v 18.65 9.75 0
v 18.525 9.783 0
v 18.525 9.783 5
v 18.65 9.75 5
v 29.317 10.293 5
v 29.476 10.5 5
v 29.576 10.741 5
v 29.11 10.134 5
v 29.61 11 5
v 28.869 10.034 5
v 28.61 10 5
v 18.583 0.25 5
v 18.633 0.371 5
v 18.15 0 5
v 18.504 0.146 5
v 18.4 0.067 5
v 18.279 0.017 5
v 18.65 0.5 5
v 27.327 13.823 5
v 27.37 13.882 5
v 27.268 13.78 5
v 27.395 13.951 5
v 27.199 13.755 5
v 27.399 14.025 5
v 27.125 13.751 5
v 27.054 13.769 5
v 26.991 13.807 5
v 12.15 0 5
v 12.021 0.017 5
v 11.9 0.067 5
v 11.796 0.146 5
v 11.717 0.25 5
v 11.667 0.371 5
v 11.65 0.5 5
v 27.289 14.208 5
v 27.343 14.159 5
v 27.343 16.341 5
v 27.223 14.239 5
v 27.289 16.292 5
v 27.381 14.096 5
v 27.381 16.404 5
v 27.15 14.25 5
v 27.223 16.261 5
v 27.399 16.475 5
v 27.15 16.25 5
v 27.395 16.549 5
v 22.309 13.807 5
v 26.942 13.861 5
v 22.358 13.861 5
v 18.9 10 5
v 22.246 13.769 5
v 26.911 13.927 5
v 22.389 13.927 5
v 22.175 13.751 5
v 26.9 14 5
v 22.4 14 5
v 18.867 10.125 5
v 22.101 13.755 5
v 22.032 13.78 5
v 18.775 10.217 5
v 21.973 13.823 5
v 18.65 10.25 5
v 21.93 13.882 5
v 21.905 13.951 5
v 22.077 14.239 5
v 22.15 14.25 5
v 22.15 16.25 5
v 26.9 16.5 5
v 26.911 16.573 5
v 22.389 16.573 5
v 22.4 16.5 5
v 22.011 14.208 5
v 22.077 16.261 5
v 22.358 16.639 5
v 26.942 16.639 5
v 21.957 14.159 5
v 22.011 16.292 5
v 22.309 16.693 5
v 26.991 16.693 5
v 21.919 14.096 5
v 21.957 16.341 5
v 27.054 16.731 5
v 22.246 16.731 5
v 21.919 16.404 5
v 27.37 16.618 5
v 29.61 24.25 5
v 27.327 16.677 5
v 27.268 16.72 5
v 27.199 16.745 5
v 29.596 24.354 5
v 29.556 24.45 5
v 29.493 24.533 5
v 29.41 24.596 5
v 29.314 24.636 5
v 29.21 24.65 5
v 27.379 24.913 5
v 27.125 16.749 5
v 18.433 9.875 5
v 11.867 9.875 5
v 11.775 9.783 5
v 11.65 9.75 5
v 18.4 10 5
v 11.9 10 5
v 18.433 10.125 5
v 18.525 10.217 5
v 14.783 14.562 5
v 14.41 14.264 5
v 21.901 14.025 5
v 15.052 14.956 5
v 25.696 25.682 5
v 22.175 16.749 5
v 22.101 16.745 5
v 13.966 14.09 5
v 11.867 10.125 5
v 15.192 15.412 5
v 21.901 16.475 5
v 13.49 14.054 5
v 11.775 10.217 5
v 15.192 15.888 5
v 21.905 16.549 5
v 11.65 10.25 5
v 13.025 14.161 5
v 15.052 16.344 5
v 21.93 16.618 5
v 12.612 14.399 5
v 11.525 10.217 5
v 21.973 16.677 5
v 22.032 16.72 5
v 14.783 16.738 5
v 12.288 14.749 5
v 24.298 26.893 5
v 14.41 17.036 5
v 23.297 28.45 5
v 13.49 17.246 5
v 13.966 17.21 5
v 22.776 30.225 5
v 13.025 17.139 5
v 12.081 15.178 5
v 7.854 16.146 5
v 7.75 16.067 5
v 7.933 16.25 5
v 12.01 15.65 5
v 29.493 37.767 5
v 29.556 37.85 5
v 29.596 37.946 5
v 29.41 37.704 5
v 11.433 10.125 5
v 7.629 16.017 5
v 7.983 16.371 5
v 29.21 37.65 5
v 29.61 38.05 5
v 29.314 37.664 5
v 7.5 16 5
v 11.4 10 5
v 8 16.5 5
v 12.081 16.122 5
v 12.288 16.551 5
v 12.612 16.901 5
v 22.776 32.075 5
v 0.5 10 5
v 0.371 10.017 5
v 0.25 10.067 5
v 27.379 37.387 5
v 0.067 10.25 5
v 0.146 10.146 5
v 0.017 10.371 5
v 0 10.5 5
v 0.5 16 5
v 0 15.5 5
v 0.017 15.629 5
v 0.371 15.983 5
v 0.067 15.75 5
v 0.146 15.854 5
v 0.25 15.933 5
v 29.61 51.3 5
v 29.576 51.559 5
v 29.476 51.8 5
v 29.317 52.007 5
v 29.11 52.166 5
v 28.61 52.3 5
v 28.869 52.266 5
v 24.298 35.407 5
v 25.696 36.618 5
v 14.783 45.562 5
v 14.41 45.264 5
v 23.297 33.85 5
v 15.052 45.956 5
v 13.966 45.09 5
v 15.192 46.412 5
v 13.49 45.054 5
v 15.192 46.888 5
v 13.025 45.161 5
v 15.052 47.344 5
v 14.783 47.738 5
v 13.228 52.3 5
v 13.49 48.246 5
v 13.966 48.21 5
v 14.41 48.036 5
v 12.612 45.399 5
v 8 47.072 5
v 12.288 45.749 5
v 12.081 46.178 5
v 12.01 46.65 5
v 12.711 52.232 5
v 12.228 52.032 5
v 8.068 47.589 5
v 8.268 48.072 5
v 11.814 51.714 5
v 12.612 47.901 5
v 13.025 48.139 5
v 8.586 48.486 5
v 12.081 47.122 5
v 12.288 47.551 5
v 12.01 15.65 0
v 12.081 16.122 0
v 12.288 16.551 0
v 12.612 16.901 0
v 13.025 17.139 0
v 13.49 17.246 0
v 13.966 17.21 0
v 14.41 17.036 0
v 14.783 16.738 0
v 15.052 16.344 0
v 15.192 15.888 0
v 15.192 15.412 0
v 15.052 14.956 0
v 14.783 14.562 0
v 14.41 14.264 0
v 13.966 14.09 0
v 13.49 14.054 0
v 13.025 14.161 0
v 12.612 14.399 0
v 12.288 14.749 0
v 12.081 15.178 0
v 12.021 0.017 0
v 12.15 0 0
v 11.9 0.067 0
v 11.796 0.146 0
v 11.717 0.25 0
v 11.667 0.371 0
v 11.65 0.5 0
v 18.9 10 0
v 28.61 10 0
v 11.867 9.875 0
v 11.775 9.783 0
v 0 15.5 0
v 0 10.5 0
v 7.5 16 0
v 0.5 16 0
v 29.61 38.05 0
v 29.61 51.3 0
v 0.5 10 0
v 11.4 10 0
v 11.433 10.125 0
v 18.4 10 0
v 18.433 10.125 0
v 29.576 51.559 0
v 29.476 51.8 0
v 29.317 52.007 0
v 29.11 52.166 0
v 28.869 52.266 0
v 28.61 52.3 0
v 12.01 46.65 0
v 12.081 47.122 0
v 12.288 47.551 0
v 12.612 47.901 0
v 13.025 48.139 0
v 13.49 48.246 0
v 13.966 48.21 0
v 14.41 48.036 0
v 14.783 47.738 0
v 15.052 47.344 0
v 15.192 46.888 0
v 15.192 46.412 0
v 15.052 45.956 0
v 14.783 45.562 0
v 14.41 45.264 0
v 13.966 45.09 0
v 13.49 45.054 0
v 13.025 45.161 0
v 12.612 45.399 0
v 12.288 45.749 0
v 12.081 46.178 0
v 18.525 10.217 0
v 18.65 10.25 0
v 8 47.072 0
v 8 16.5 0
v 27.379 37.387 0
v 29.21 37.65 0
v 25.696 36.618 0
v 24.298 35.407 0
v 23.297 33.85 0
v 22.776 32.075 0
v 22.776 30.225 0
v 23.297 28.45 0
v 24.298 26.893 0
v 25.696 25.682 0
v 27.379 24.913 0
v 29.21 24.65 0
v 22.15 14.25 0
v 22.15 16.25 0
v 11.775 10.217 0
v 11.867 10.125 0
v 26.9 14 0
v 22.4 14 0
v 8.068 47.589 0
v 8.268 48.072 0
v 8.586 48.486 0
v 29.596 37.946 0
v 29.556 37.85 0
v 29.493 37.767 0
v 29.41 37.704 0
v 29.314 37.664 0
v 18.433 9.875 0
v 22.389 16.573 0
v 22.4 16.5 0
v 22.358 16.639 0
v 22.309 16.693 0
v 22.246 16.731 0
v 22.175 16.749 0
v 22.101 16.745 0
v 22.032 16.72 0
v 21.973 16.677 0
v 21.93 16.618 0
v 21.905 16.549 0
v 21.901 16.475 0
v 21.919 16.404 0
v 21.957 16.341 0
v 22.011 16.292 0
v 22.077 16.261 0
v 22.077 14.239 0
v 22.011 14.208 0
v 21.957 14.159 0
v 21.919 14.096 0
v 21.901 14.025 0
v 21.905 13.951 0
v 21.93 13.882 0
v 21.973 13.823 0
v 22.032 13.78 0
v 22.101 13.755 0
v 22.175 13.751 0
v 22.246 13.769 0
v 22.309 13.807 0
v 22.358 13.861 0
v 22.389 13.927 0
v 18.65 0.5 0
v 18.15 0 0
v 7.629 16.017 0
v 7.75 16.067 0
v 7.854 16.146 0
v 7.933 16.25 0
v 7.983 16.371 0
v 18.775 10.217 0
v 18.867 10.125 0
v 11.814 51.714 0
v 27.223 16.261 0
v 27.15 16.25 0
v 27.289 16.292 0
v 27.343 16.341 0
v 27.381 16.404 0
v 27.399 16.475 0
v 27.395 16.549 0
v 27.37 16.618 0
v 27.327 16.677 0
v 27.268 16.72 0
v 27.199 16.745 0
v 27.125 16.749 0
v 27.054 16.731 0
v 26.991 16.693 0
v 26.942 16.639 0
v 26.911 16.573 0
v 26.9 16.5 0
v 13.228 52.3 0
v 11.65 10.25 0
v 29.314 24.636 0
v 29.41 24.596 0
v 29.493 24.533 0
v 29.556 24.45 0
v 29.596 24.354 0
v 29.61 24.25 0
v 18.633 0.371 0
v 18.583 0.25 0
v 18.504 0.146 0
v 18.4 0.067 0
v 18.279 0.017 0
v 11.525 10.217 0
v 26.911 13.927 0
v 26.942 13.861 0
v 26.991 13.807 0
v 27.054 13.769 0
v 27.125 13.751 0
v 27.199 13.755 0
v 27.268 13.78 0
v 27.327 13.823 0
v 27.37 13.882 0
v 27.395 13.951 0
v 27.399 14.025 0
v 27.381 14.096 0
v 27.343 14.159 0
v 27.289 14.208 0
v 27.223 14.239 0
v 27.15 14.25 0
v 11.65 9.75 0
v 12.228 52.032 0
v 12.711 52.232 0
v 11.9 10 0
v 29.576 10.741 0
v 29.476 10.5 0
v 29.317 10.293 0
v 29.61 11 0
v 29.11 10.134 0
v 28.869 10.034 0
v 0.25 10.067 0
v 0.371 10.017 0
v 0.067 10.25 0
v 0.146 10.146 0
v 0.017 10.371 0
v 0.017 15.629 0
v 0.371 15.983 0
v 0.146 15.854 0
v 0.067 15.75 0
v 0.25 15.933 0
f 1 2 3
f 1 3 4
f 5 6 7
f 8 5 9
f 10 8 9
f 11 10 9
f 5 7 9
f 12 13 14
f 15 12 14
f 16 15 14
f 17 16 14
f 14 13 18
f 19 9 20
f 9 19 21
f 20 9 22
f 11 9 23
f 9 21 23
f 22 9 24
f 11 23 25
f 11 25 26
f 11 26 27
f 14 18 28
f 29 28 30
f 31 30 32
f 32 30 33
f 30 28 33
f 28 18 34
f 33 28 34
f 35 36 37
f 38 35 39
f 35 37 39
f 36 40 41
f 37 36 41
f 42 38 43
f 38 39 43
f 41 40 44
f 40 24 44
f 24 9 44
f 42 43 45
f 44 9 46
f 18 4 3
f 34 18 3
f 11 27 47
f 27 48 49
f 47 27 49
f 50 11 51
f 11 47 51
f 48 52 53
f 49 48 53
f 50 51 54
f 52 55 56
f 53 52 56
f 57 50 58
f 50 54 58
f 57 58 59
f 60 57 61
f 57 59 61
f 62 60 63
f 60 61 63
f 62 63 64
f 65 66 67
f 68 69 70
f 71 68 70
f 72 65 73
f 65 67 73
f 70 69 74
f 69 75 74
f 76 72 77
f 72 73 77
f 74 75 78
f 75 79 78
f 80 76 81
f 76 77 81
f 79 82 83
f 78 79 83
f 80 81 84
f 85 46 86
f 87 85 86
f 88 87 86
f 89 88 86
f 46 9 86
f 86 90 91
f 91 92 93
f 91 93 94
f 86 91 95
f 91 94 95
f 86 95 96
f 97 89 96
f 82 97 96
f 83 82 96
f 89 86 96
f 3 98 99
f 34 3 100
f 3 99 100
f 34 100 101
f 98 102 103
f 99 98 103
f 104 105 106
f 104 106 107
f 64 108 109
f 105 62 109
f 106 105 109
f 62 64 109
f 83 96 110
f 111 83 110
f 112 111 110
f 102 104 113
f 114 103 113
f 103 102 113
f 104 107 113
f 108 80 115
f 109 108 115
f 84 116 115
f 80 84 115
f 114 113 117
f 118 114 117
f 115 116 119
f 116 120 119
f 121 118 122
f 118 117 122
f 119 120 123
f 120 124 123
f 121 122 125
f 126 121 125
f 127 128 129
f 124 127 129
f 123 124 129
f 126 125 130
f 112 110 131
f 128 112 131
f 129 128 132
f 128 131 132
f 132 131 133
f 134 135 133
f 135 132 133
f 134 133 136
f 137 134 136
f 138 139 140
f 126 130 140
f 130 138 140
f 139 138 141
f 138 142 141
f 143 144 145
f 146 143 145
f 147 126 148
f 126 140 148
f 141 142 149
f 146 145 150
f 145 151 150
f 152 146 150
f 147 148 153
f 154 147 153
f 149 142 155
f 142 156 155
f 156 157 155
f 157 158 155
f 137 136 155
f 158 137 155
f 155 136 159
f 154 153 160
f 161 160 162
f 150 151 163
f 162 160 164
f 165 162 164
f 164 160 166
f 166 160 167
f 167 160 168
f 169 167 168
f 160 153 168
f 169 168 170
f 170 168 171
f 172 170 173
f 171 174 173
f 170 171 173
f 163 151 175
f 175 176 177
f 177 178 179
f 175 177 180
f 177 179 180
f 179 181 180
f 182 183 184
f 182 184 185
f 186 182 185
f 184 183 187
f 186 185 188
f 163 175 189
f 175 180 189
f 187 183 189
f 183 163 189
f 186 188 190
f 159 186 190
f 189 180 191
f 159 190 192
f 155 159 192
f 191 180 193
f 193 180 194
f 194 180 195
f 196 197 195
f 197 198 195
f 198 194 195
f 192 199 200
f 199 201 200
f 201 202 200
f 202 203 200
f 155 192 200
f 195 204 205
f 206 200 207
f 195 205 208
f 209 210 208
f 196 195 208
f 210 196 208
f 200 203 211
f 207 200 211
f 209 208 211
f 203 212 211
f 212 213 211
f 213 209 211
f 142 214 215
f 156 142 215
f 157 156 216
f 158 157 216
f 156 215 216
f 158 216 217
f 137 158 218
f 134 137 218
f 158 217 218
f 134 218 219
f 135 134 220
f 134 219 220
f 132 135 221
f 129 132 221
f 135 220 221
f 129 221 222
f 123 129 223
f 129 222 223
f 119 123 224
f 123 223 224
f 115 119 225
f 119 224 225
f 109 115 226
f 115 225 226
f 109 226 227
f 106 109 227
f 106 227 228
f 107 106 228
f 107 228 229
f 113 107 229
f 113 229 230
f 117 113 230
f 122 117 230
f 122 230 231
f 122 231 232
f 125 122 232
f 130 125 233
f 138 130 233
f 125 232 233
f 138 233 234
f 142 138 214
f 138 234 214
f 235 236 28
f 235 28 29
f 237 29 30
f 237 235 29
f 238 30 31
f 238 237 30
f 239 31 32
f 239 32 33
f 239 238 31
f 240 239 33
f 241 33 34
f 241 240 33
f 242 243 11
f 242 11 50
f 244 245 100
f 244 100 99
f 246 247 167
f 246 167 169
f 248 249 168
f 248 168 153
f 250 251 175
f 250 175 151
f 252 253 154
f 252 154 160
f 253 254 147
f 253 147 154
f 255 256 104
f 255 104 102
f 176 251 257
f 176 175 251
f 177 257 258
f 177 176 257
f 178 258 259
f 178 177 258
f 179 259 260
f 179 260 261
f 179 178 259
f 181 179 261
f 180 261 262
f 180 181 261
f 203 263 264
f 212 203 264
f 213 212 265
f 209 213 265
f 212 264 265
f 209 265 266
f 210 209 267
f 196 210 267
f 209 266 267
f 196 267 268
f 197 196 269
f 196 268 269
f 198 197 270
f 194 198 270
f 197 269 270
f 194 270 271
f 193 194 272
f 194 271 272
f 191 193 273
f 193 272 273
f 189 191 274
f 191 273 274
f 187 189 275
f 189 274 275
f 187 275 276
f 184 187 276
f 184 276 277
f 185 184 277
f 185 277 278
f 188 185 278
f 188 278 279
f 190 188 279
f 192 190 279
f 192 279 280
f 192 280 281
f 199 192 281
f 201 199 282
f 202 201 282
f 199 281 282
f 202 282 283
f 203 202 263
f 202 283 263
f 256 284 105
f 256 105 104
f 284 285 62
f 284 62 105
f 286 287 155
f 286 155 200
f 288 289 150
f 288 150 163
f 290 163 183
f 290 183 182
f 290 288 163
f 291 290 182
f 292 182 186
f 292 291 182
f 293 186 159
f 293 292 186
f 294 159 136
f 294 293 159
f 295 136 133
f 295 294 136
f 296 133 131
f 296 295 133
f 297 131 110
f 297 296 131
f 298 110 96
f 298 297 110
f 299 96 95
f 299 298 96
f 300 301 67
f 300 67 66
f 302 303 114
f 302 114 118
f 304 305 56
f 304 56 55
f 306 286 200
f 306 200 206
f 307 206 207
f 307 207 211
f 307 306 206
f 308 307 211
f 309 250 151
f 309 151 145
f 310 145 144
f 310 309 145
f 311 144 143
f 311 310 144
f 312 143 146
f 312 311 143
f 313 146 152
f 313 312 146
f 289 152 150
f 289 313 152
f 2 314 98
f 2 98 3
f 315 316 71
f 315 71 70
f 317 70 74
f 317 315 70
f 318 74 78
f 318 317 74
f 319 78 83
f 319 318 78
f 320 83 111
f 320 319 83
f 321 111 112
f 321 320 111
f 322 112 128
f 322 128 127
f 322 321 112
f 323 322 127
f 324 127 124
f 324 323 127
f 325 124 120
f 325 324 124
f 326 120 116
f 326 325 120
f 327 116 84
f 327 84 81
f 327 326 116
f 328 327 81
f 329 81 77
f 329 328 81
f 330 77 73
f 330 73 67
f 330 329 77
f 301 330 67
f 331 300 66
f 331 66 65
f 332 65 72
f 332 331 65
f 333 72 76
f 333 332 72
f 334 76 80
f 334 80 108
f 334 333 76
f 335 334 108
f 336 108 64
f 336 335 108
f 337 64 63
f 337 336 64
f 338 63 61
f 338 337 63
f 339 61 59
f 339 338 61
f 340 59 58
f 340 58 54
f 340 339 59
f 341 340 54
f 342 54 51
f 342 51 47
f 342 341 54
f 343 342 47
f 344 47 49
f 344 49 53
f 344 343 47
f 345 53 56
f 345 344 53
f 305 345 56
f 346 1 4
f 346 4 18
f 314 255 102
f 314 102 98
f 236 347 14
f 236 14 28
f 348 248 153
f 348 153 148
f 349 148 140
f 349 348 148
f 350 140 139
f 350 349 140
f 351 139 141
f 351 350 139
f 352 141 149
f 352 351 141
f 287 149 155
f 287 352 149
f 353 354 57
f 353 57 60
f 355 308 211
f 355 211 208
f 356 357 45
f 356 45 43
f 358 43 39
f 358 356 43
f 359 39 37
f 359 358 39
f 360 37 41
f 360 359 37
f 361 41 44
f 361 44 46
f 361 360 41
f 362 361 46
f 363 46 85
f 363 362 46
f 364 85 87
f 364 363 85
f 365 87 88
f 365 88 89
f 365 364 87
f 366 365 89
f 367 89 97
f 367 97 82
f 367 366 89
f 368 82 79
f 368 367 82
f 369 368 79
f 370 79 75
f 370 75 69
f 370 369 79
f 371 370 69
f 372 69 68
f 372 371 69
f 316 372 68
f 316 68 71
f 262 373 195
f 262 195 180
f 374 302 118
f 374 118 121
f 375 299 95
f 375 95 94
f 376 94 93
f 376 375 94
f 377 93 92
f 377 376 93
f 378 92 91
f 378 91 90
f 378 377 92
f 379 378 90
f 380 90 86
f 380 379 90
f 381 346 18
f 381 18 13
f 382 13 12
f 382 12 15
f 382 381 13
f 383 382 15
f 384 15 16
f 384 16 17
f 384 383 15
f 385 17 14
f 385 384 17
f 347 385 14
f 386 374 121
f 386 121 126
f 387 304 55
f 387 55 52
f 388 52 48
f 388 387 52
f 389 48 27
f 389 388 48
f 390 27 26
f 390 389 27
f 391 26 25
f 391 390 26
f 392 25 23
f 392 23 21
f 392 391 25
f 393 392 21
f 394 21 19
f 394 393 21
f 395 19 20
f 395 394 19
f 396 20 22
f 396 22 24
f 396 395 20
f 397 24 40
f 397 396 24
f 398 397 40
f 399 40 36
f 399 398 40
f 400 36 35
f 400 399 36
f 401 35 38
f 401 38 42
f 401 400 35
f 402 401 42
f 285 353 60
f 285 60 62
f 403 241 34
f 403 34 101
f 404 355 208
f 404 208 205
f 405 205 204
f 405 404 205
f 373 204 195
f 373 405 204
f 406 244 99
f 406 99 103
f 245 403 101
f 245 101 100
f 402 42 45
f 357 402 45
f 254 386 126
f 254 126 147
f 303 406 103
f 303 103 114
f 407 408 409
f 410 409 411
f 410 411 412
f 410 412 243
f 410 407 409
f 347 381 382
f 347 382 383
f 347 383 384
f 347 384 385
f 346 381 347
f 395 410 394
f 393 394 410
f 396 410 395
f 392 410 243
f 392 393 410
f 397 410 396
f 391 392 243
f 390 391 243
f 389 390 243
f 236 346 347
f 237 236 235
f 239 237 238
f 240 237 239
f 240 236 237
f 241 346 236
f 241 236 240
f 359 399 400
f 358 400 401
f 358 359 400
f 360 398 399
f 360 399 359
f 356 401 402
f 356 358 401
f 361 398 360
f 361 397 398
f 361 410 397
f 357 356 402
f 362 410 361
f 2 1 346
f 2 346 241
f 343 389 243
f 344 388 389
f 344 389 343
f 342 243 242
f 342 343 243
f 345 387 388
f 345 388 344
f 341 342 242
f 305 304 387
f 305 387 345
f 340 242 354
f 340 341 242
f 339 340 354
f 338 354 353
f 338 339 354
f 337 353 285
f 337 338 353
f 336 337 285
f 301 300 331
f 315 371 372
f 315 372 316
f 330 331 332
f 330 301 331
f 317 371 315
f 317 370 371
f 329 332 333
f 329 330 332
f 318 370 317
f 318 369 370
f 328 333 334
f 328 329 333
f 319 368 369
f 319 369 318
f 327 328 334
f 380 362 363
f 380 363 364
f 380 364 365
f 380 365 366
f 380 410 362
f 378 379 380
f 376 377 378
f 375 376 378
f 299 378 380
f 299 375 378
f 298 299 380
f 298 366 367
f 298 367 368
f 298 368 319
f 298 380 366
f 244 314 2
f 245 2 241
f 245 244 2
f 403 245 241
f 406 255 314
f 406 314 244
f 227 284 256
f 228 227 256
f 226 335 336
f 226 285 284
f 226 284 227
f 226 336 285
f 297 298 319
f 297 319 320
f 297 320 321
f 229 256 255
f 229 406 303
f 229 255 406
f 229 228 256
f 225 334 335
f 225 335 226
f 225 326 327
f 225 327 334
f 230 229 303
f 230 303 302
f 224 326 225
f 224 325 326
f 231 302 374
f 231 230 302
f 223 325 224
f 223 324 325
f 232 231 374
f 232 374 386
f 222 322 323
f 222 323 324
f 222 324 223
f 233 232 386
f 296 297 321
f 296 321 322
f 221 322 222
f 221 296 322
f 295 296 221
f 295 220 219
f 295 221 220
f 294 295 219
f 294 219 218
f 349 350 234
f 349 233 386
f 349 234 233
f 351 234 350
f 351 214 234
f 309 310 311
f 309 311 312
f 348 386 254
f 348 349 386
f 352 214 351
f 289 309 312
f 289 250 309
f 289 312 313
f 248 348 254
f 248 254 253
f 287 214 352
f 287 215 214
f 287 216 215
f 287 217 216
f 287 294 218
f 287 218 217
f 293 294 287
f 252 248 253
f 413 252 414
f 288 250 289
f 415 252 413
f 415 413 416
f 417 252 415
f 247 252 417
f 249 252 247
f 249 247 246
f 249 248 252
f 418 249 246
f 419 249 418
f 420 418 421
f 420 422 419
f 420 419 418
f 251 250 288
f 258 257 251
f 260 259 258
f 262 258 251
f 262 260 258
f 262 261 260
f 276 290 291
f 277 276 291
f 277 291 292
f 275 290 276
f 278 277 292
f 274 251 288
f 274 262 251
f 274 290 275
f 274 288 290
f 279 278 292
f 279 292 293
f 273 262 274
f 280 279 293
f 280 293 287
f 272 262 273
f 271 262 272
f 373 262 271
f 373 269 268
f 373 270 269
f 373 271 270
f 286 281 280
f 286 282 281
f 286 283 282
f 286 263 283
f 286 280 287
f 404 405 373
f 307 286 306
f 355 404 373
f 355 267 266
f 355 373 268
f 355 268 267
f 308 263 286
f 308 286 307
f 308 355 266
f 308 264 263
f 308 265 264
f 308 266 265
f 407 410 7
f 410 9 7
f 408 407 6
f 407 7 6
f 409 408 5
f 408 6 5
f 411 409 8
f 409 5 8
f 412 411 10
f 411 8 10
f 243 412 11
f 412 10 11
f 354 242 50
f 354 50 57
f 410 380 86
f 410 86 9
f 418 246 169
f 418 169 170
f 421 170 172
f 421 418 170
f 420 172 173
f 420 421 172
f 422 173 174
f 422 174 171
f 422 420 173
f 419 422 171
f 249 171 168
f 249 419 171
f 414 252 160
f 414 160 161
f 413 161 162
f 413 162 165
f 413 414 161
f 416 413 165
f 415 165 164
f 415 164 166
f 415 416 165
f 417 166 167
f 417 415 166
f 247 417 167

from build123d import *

# Parameters (mm, degrees)
ESQUISSE1_R        = 1.6
BOSS_EXTRU_1_DEPTH = 5
CONG_1_R           = 1


with BuildPart() as part:
    # Esquisse1 → Boss.-Extru.1 (new body)
    with BuildSketch(Plane(origin=(0, 0, 0), x_dir=(-1, 0, 0), z_dir=(0, 0, -1))):
        with BuildLine():
            Line((-29.61, 24.250000923), (-29.61, 10))
            Line((-29.61, 10), (-18.900000032, 10))
            Line((-18.900000032, 10), (-18.866500027, 10.125000016))
            Line((-18.866500027, 10.125000016), (-18.775000016, 10.216510027))
            Line((-18.775000016, 10.216510027), (-18.65, 10.250000032))
            Line((-18.65, 10.250000032), (-18.524999984, 10.216510027))
            Line((-18.524999984, 10.216510027), (-18.433489973, 10.125000016))
            Line((-18.433489973, 10.125000016), (-18.399999968, 10))
            Line((-18.399999968, 10), (-18.433489973, 9.874995396))
            Line((-18.433489973, 9.874995396), (-18.524999984, 9.783488385))
            Line((-18.524999984, 9.783488385), (-18.65, 9.74999538))
            Line((-18.65, 9.74999538), (-18.65, 0.499994211))
            ThreePointArc((-18.65, 0.499994211), (-18.503553372, 0.146440776), (-18.149999937, -5.852e-06))
            Line((-18.149999937, -5.852e-06), (-12.150000163, -5.852e-06))
            ThreePointArc((-12.150000163, -5.852e-06), (-11.796446657, 0.146440805), (-11.65, 0.499994311))
            Line((-11.65, 0.499994311), (-11.65, 9.74999538))
            Line((-11.65, 9.74999538), (-11.775000016, 9.783488385))
            Line((-11.775000016, 9.783488385), (-11.866510027, 9.874995396))
            Line((-11.866510027, 9.874995396), (-11.900000032, 9.999995412))
            Line((-11.900000032, 9.999995412), (-11.866510027, 10.124995428))
            Line((-11.866510027, 10.124995428), (-11.775000016, 10.216505439))
            Line((-11.775000016, 10.216505439), (-11.65, 10.249995444))
            Line((-11.65, 10.249995444), (-11.524999984, 10.216505439))
            Line((-11.524999984, 10.216505439), (-11.433489973, 10.124995428))
            Line((-11.433489973, 10.124995428), (-11.399999968, 9.999995412))
            Line((-11.399999968, 9.999995412), (-0.499947825, 9.999995412))
            ThreePointArc((-0.499947825, 9.999995412), (-0.14639439, 10.14644204), (5.2238e-05, 10.499995475))
            Line((5.2238e-05, 10.499995475), (5.2238e-05, 15.499995349))
            ThreePointArc((5.2238e-05, 15.499995349), (-0.14639439, 15.853548784), (-0.499947825, 15.999995412))
            Line((-0.499947825, 15.999995412), (-7.49994871, 15.999995412))
            ThreePointArc((-7.49994871, 15.999995412), (-7.853502145, 16.14644204), (-7.999948773, 16.499995475))
            Line((-7.999948773, 16.499995475), (-7.999948773, 47.071569339))
            ThreePointArc((-7.999948773, 47.071569339), (-8.152190984, 47.836942158), (-8.585740096, 48.485793767))
            Line((-8.585740096, 48.485793767), (-11.814159255, 51.714209926))
            ThreePointArc((-11.814159255, 51.714209926), (-12.46301048, 52.147758127), (-13.228382526, 52.3))
            Line((-13.228382526, 52.3), (-29.61, 52.3))
            Line((-29.61, 52.3), (-29.61, 38.049999077))
            ThreePointArc((-29.61, 38.049999077), (-29.492842932, 37.767156996), (-29.210000822, 37.65))
            ThreePointArc((-29.210000822, 37.65), (-22.71, 31.15), (-29.210000822, 24.65))
            ThreePointArc((-29.210000822, 24.65), (-29.492842932, 24.532843004), (-29.61, 24.250000923))
        make_face()
        with Locations((-13.61, 46.65)):
            Circle(ESQUISSE1_R, mode=Mode.SUBTRACT)
        with Locations((-13.61, 15.65)):
            Circle(ESQUISSE1_R, mode=Mode.SUBTRACT)
        with BuildLine():
            Line((-22.400002831, 14.000001769), (-26.900003431, 14.000001769))
            ThreePointArc((-26.900003431, 14.000001769), (-27.326780127, 13.823225074), (-27.150003431, 14.250001769))
            Line((-27.150003431, 14.250001769), (-27.150003431, 16.250002022))
            ThreePointArc((-27.150003431, 16.250002022), (-27.326780127, 16.676778718), (-26.900003431, 16.500002022))
            Line((-26.900003431, 16.500002022), (-22.400002831, 16.500002022))
            ThreePointArc((-22.400002831, 16.500002022), (-21.973226158, 16.676778803), (-22.150002831, 16.250002085))
            Line((-22.150002831, 16.250002085), (-22.150002831, 14.250001769))
            ThreePointArc((-22.150002831, 14.250001769), (-21.973226136, 13.823225074), (-22.400002831, 14.000001769))
        make_face(mode=Mode.SUBTRACT)
    extrude(amount=-BOSS_EXTRU_1_DEPTH)

    # Congé1
    cong_1_edges = [part.edges().sort_by_distance(p)[0] for p in [
        (29.61, 10, 2.5),
        (29.61, 52.3, 2.5),
    ]]
    fillet(cong_1_edges, radius=CONG_1_R)


solid = part.part
